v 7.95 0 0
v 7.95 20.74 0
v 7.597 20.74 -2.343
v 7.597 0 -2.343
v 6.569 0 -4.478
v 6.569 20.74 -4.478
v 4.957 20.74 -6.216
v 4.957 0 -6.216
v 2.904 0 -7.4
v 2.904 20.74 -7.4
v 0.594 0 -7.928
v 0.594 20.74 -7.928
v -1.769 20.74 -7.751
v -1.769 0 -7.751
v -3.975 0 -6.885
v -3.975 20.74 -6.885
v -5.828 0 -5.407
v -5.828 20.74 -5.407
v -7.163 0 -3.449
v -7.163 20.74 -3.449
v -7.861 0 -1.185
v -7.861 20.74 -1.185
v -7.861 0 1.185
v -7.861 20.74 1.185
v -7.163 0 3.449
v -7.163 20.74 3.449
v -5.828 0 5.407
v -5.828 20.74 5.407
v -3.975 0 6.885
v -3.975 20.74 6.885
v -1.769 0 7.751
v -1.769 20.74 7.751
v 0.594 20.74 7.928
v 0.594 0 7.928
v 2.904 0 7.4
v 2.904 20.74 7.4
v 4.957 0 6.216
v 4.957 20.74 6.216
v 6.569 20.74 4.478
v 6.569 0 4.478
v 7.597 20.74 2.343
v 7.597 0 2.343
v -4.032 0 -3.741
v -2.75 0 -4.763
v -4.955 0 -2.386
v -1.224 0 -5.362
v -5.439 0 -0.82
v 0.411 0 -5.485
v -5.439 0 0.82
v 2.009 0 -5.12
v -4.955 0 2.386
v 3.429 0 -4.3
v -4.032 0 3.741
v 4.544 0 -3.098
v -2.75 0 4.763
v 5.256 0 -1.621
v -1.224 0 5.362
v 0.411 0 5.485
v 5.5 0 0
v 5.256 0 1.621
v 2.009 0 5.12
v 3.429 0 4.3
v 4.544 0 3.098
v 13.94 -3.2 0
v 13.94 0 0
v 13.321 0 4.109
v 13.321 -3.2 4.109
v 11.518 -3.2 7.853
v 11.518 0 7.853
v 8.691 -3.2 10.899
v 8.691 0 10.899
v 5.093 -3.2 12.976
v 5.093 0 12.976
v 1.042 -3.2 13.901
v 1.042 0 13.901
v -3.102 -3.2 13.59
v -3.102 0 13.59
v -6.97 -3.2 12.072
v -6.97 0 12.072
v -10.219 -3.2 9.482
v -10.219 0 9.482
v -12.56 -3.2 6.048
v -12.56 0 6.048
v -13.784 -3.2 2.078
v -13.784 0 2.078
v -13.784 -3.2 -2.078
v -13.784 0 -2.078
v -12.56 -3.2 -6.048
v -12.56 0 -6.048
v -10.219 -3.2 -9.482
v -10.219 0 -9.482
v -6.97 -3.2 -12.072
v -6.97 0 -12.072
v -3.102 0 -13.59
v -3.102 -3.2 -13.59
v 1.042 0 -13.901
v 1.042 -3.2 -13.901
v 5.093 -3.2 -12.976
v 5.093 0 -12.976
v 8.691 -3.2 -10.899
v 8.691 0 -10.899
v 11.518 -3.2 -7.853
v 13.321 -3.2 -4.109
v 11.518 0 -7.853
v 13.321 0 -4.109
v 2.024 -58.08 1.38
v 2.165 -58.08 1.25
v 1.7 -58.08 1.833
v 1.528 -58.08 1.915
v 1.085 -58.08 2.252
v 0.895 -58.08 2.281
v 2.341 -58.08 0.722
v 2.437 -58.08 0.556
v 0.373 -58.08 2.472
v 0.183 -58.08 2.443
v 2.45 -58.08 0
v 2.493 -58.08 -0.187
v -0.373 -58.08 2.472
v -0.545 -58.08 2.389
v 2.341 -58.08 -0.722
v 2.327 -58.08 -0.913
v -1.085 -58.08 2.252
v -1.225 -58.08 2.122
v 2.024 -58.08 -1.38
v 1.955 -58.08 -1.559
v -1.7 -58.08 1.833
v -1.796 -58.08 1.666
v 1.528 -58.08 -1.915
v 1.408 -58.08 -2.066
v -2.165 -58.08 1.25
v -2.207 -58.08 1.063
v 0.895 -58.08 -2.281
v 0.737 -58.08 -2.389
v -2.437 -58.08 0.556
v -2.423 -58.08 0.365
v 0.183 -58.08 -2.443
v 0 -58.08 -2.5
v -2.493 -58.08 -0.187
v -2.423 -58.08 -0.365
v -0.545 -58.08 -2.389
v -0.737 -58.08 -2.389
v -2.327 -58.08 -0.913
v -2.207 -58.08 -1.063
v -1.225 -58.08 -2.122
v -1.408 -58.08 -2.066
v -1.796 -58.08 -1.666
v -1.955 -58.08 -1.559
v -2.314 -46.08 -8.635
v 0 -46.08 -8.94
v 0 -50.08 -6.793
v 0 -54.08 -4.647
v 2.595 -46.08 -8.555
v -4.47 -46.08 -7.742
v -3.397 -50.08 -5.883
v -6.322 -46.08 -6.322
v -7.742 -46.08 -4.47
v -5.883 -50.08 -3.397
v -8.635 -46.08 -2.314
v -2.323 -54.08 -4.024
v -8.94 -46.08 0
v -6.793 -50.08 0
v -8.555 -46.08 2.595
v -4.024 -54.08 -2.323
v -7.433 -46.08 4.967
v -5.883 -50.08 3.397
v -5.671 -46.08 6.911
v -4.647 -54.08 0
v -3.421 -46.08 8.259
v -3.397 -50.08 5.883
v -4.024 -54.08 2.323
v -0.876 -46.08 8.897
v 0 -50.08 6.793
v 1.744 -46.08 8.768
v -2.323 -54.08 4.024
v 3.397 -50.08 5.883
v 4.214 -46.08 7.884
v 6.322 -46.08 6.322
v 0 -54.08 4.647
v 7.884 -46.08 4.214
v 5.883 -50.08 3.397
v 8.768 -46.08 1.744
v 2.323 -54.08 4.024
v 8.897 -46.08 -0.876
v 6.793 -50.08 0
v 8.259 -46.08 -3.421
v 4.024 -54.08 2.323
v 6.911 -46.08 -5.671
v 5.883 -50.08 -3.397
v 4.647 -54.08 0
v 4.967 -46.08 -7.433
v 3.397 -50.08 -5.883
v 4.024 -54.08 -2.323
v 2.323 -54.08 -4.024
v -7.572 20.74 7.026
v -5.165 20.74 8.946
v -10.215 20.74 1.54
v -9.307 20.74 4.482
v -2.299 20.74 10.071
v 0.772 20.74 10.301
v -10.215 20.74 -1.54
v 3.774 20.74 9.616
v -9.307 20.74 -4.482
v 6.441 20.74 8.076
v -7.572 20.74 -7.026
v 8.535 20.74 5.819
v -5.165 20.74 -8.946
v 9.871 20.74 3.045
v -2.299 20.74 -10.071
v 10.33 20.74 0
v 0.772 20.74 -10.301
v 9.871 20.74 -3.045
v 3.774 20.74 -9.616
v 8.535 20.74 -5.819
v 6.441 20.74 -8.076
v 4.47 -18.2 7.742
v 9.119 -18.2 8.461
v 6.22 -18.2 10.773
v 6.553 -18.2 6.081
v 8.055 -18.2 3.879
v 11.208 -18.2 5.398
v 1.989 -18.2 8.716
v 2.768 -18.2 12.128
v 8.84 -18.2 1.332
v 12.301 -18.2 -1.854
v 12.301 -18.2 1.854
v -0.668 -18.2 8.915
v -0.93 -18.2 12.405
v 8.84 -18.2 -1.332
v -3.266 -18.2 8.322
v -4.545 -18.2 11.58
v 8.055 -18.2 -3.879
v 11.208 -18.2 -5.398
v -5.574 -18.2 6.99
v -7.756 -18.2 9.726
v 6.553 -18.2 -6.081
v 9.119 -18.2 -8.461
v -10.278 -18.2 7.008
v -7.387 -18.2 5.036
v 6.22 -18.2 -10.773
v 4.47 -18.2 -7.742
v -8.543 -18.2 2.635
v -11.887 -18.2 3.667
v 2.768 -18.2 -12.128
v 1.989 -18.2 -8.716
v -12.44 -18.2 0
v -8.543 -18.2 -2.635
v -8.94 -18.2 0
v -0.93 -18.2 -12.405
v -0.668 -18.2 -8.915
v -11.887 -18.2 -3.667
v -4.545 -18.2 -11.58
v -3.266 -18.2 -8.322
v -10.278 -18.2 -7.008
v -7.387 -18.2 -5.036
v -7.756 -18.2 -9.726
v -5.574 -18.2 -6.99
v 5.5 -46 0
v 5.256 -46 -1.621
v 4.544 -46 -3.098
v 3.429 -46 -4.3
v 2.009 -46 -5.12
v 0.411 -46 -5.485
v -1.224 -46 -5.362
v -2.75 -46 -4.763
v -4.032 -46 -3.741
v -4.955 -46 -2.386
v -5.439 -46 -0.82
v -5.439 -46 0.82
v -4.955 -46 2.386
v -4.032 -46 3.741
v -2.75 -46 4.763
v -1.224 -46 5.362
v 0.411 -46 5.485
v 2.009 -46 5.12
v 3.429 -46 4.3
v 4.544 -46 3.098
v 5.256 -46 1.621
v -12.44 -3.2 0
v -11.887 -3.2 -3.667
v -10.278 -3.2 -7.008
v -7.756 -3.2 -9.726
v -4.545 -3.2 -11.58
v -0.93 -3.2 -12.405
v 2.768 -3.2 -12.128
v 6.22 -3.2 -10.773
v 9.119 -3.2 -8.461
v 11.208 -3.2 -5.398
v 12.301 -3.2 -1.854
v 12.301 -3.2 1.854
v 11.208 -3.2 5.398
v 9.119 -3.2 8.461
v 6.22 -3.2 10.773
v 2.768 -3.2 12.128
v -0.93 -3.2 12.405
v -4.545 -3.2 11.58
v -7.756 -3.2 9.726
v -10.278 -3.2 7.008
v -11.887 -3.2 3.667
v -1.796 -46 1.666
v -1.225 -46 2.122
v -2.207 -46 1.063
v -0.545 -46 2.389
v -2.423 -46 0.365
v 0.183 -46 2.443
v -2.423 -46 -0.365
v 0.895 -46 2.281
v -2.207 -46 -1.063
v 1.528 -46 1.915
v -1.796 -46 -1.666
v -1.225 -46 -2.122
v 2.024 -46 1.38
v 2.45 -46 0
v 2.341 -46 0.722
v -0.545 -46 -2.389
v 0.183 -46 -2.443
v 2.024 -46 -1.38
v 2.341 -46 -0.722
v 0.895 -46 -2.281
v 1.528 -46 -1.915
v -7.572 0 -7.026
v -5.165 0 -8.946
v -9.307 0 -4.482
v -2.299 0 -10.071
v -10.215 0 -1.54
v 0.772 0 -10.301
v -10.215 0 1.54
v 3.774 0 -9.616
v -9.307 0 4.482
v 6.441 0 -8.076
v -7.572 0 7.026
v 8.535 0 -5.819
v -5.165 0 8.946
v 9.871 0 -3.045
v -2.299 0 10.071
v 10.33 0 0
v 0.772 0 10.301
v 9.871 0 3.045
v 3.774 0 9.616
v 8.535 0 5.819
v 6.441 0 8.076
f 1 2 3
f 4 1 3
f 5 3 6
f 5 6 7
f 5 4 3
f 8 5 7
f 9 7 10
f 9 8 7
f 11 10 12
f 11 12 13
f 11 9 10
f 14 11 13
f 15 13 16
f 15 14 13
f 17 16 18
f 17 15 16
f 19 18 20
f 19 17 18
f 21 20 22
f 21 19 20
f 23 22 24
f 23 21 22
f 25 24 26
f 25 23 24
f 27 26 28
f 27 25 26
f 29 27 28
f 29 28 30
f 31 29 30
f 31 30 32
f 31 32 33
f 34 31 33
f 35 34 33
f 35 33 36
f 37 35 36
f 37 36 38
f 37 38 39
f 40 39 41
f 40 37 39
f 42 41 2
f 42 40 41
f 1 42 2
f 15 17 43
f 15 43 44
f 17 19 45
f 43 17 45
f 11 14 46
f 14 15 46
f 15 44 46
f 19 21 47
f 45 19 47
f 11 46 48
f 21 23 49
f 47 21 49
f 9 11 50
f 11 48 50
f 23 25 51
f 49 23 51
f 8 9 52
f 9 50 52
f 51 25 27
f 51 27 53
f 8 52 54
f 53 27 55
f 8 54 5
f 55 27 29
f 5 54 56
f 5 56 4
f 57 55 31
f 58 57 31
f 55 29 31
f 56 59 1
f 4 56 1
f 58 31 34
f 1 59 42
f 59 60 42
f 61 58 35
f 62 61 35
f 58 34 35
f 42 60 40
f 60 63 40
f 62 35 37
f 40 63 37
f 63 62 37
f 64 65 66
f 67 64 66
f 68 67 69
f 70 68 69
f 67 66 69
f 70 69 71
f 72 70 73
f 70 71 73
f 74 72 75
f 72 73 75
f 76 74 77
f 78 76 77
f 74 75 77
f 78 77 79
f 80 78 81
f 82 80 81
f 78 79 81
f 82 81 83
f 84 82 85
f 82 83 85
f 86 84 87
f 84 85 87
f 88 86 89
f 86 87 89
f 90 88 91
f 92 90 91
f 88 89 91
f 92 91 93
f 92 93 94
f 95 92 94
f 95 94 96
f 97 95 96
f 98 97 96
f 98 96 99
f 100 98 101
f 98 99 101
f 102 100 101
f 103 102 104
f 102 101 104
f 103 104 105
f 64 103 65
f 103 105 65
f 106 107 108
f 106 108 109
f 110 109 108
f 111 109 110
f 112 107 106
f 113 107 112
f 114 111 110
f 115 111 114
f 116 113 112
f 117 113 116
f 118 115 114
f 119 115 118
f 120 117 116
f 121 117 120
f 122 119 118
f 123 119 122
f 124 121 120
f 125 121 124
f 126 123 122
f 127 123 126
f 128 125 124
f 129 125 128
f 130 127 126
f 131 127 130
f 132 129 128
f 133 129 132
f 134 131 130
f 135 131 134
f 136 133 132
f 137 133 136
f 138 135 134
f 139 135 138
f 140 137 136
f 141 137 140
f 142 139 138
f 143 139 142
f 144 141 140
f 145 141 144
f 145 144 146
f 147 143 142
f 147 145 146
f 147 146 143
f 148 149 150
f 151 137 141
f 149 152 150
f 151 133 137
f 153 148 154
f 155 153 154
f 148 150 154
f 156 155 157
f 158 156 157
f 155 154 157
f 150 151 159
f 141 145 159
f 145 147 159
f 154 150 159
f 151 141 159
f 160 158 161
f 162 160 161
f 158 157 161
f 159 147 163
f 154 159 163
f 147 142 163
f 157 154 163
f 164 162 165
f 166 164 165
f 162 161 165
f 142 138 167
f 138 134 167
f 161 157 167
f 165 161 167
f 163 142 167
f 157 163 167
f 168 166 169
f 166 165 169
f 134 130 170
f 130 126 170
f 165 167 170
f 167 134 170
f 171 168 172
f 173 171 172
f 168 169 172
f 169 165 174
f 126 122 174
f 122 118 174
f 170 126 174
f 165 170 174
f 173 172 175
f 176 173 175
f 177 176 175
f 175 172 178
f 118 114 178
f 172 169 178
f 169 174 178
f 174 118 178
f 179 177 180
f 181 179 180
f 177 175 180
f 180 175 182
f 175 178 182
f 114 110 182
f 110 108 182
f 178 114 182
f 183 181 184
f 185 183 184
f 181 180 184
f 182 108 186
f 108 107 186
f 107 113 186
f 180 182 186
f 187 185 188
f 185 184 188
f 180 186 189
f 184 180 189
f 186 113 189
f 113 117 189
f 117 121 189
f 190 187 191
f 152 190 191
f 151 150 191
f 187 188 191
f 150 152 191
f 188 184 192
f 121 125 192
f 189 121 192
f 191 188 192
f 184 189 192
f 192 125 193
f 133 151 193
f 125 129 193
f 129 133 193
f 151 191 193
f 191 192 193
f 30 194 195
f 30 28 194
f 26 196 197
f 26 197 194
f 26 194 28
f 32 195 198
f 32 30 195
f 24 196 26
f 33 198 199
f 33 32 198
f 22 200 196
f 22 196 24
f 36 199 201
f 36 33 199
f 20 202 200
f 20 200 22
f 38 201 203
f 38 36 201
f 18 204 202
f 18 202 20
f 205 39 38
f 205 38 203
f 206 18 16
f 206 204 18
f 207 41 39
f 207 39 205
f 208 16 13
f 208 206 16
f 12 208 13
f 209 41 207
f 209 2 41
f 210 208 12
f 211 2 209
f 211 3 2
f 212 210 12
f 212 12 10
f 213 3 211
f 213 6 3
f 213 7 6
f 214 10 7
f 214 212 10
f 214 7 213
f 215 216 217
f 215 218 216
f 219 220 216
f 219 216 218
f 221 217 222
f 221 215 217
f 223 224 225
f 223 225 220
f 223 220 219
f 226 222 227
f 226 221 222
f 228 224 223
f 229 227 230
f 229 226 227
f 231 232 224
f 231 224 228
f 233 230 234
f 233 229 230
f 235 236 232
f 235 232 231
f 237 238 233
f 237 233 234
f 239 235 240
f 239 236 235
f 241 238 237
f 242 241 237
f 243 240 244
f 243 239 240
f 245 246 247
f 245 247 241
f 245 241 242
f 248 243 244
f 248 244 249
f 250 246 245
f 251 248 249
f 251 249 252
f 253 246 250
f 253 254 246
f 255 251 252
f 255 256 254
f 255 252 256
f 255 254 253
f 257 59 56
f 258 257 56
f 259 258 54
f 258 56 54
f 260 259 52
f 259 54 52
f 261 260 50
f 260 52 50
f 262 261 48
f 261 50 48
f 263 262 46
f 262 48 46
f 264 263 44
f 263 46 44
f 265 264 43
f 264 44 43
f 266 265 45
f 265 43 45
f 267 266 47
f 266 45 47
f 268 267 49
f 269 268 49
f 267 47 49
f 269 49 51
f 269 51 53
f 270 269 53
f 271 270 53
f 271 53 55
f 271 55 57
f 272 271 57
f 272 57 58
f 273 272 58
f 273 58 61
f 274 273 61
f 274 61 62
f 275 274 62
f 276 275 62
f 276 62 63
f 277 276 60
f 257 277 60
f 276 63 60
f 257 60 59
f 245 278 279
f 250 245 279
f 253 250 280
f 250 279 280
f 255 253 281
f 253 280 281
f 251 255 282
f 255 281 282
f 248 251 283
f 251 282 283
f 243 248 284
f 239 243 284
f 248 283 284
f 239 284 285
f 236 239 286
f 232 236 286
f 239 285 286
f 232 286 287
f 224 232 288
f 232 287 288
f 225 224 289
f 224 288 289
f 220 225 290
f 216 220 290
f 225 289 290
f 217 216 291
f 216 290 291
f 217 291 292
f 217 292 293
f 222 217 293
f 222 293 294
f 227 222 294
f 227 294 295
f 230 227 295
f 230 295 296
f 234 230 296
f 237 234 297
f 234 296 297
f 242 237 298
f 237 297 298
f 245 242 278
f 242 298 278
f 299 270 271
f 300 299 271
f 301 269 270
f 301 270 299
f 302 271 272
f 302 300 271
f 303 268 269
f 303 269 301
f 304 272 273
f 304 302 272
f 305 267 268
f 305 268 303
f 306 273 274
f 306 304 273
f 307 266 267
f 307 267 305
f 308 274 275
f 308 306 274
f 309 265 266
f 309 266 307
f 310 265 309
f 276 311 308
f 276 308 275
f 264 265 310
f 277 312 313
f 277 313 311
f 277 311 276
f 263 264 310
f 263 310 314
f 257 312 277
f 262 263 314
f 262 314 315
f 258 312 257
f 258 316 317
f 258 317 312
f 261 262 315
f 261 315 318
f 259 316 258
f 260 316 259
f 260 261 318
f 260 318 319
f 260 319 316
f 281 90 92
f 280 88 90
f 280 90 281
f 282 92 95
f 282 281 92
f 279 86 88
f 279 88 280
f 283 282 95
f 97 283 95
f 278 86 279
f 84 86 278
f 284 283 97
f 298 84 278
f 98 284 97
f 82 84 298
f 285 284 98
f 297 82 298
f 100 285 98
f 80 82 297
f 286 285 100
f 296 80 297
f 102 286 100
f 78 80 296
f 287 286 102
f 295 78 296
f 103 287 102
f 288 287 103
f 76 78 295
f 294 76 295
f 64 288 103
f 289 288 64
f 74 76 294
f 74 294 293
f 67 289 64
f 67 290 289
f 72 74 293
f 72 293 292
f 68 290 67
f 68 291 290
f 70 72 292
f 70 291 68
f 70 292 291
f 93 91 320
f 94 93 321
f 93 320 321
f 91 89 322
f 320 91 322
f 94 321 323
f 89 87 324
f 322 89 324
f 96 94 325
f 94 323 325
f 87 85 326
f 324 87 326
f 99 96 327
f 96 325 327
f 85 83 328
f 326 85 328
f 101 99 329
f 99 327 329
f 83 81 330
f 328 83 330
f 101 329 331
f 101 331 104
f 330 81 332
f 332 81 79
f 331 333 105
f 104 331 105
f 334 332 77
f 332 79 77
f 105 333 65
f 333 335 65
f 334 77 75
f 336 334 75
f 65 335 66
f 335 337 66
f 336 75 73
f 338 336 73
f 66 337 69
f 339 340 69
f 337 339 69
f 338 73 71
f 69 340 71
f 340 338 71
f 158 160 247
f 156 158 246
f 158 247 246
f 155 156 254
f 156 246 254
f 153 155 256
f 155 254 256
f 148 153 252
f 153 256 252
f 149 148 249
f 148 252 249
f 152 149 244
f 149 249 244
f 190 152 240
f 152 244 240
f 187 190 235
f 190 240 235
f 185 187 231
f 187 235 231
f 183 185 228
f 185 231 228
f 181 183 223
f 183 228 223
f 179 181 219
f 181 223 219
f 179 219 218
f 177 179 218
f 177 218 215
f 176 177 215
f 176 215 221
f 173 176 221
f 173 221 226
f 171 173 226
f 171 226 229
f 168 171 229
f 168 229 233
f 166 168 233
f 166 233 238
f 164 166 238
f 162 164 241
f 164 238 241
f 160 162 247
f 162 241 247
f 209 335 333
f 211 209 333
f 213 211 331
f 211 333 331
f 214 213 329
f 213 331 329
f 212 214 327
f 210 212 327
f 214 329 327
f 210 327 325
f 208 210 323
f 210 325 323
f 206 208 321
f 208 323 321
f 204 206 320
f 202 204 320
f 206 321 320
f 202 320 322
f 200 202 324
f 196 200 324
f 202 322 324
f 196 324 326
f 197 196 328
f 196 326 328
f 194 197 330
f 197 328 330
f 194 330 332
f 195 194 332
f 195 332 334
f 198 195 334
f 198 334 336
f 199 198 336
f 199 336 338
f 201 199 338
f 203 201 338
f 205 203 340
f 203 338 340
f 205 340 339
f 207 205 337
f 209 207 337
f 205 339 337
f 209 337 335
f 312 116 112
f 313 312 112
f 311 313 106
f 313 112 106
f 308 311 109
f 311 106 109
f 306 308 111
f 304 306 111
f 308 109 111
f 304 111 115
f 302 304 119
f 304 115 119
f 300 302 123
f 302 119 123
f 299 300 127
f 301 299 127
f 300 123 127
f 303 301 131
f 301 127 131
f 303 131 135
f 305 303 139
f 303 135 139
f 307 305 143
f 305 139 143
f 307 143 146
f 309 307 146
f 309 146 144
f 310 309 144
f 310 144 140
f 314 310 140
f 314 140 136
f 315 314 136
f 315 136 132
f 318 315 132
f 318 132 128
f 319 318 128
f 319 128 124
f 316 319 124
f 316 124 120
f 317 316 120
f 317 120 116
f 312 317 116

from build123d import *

# Parameters (mm, degrees)
SKETCH1_R           = 10.33
SKETCH1_R_2         = 7.95
BOSS_EXTRUDE1_DEPTH = 20.74
SKETCH2_R           = 13.94
BOSS_EXTRUDE2_DEPTH = 3.2
SKETCH3_R           = 12.44
BOSS_EXTRUDE3_DEPTH = 15
SKETCH4_R           = 8.94
BOSS_EXTRUDE4_DEPTH = 39.88
SKETCH6_R           = 2.45
CUT_EXTRUDE1_DEPTH  = 79.82
SKETCH7_R           = 5.5
CUT_EXTRUDE2_DEPTH  = 46


with BuildPart() as part:
    # Sketch1 → Boss-Extrude1 (new body)
    with BuildSketch(Plane(origin=(0, 0, 0), x_dir=(1, 0, 0), z_dir=(0, 1, 0))):
        Circle(SKETCH1_R)
        Circle(SKETCH1_R_2, mode=Mode.SUBTRACT)
    extrude(amount=BOSS_EXTRUDE1_DEPTH)

    # Sketch2 → Boss-Extrude2 (add)
    with BuildSketch(Plane.XZ):
        Circle(SKETCH2_R)
    extrude(amount=BOSS_EXTRUDE2_DEPTH)

    # Sketch3 → Boss-Extrude3 (add)
    with BuildSketch(Plane(origin=(0, -3.2, 0), x_dir=(-1, 0, 0), z_dir=(0, -1, 0))):
        Circle(SKETCH3_R)
    extrude(amount=BOSS_EXTRUDE3_DEPTH)

    # Sketch4 → Boss-Extrude4 (add)
    with BuildSketch(Plane(origin=(0, -18.2, 0), x_dir=(-1, 0, 0), z_dir=(0, -1, 0))):
        Circle(SKETCH4_R)
    extrude(amount=BOSS_EXTRUDE4_DEPTH)

    # Sketch5 → Cut-Revolve1 (revolve, cut)
    with BuildSketch(Plane(origin=(0, 0, 0), x_dir=(0, 0, -1), z_dir=(1, 0, 0))):
        Polygon((8.94, -46.08), (2.5, -58.08), (8.94, -58.08), align=None)
    revolve(axis=Axis((0, -58.08, 0), (0, 1, 0)), mode=Mode.SUBTRACT)

    # Sketch6 → Cut-Extrude1 (cut, through all)
    with BuildSketch(Plane.XZ.offset(58.08)):
        Circle(SKETCH6_R)
    extrude(amount=-CUT_EXTRUDE1_DEPTH, mode=Mode.SUBTRACT)

    # Sketch7 → Cut-Extrude2 (cut)
    with BuildSketch(Plane(origin=(0, 0, 0), x_dir=(1, 0, 0), z_dir=(0, 1, 0))):
        Circle(SKETCH7_R)
    extrude(amount=-CUT_EXTRUDE2_DEPTH, mode=Mode.SUBTRACT)


solid = part.part
